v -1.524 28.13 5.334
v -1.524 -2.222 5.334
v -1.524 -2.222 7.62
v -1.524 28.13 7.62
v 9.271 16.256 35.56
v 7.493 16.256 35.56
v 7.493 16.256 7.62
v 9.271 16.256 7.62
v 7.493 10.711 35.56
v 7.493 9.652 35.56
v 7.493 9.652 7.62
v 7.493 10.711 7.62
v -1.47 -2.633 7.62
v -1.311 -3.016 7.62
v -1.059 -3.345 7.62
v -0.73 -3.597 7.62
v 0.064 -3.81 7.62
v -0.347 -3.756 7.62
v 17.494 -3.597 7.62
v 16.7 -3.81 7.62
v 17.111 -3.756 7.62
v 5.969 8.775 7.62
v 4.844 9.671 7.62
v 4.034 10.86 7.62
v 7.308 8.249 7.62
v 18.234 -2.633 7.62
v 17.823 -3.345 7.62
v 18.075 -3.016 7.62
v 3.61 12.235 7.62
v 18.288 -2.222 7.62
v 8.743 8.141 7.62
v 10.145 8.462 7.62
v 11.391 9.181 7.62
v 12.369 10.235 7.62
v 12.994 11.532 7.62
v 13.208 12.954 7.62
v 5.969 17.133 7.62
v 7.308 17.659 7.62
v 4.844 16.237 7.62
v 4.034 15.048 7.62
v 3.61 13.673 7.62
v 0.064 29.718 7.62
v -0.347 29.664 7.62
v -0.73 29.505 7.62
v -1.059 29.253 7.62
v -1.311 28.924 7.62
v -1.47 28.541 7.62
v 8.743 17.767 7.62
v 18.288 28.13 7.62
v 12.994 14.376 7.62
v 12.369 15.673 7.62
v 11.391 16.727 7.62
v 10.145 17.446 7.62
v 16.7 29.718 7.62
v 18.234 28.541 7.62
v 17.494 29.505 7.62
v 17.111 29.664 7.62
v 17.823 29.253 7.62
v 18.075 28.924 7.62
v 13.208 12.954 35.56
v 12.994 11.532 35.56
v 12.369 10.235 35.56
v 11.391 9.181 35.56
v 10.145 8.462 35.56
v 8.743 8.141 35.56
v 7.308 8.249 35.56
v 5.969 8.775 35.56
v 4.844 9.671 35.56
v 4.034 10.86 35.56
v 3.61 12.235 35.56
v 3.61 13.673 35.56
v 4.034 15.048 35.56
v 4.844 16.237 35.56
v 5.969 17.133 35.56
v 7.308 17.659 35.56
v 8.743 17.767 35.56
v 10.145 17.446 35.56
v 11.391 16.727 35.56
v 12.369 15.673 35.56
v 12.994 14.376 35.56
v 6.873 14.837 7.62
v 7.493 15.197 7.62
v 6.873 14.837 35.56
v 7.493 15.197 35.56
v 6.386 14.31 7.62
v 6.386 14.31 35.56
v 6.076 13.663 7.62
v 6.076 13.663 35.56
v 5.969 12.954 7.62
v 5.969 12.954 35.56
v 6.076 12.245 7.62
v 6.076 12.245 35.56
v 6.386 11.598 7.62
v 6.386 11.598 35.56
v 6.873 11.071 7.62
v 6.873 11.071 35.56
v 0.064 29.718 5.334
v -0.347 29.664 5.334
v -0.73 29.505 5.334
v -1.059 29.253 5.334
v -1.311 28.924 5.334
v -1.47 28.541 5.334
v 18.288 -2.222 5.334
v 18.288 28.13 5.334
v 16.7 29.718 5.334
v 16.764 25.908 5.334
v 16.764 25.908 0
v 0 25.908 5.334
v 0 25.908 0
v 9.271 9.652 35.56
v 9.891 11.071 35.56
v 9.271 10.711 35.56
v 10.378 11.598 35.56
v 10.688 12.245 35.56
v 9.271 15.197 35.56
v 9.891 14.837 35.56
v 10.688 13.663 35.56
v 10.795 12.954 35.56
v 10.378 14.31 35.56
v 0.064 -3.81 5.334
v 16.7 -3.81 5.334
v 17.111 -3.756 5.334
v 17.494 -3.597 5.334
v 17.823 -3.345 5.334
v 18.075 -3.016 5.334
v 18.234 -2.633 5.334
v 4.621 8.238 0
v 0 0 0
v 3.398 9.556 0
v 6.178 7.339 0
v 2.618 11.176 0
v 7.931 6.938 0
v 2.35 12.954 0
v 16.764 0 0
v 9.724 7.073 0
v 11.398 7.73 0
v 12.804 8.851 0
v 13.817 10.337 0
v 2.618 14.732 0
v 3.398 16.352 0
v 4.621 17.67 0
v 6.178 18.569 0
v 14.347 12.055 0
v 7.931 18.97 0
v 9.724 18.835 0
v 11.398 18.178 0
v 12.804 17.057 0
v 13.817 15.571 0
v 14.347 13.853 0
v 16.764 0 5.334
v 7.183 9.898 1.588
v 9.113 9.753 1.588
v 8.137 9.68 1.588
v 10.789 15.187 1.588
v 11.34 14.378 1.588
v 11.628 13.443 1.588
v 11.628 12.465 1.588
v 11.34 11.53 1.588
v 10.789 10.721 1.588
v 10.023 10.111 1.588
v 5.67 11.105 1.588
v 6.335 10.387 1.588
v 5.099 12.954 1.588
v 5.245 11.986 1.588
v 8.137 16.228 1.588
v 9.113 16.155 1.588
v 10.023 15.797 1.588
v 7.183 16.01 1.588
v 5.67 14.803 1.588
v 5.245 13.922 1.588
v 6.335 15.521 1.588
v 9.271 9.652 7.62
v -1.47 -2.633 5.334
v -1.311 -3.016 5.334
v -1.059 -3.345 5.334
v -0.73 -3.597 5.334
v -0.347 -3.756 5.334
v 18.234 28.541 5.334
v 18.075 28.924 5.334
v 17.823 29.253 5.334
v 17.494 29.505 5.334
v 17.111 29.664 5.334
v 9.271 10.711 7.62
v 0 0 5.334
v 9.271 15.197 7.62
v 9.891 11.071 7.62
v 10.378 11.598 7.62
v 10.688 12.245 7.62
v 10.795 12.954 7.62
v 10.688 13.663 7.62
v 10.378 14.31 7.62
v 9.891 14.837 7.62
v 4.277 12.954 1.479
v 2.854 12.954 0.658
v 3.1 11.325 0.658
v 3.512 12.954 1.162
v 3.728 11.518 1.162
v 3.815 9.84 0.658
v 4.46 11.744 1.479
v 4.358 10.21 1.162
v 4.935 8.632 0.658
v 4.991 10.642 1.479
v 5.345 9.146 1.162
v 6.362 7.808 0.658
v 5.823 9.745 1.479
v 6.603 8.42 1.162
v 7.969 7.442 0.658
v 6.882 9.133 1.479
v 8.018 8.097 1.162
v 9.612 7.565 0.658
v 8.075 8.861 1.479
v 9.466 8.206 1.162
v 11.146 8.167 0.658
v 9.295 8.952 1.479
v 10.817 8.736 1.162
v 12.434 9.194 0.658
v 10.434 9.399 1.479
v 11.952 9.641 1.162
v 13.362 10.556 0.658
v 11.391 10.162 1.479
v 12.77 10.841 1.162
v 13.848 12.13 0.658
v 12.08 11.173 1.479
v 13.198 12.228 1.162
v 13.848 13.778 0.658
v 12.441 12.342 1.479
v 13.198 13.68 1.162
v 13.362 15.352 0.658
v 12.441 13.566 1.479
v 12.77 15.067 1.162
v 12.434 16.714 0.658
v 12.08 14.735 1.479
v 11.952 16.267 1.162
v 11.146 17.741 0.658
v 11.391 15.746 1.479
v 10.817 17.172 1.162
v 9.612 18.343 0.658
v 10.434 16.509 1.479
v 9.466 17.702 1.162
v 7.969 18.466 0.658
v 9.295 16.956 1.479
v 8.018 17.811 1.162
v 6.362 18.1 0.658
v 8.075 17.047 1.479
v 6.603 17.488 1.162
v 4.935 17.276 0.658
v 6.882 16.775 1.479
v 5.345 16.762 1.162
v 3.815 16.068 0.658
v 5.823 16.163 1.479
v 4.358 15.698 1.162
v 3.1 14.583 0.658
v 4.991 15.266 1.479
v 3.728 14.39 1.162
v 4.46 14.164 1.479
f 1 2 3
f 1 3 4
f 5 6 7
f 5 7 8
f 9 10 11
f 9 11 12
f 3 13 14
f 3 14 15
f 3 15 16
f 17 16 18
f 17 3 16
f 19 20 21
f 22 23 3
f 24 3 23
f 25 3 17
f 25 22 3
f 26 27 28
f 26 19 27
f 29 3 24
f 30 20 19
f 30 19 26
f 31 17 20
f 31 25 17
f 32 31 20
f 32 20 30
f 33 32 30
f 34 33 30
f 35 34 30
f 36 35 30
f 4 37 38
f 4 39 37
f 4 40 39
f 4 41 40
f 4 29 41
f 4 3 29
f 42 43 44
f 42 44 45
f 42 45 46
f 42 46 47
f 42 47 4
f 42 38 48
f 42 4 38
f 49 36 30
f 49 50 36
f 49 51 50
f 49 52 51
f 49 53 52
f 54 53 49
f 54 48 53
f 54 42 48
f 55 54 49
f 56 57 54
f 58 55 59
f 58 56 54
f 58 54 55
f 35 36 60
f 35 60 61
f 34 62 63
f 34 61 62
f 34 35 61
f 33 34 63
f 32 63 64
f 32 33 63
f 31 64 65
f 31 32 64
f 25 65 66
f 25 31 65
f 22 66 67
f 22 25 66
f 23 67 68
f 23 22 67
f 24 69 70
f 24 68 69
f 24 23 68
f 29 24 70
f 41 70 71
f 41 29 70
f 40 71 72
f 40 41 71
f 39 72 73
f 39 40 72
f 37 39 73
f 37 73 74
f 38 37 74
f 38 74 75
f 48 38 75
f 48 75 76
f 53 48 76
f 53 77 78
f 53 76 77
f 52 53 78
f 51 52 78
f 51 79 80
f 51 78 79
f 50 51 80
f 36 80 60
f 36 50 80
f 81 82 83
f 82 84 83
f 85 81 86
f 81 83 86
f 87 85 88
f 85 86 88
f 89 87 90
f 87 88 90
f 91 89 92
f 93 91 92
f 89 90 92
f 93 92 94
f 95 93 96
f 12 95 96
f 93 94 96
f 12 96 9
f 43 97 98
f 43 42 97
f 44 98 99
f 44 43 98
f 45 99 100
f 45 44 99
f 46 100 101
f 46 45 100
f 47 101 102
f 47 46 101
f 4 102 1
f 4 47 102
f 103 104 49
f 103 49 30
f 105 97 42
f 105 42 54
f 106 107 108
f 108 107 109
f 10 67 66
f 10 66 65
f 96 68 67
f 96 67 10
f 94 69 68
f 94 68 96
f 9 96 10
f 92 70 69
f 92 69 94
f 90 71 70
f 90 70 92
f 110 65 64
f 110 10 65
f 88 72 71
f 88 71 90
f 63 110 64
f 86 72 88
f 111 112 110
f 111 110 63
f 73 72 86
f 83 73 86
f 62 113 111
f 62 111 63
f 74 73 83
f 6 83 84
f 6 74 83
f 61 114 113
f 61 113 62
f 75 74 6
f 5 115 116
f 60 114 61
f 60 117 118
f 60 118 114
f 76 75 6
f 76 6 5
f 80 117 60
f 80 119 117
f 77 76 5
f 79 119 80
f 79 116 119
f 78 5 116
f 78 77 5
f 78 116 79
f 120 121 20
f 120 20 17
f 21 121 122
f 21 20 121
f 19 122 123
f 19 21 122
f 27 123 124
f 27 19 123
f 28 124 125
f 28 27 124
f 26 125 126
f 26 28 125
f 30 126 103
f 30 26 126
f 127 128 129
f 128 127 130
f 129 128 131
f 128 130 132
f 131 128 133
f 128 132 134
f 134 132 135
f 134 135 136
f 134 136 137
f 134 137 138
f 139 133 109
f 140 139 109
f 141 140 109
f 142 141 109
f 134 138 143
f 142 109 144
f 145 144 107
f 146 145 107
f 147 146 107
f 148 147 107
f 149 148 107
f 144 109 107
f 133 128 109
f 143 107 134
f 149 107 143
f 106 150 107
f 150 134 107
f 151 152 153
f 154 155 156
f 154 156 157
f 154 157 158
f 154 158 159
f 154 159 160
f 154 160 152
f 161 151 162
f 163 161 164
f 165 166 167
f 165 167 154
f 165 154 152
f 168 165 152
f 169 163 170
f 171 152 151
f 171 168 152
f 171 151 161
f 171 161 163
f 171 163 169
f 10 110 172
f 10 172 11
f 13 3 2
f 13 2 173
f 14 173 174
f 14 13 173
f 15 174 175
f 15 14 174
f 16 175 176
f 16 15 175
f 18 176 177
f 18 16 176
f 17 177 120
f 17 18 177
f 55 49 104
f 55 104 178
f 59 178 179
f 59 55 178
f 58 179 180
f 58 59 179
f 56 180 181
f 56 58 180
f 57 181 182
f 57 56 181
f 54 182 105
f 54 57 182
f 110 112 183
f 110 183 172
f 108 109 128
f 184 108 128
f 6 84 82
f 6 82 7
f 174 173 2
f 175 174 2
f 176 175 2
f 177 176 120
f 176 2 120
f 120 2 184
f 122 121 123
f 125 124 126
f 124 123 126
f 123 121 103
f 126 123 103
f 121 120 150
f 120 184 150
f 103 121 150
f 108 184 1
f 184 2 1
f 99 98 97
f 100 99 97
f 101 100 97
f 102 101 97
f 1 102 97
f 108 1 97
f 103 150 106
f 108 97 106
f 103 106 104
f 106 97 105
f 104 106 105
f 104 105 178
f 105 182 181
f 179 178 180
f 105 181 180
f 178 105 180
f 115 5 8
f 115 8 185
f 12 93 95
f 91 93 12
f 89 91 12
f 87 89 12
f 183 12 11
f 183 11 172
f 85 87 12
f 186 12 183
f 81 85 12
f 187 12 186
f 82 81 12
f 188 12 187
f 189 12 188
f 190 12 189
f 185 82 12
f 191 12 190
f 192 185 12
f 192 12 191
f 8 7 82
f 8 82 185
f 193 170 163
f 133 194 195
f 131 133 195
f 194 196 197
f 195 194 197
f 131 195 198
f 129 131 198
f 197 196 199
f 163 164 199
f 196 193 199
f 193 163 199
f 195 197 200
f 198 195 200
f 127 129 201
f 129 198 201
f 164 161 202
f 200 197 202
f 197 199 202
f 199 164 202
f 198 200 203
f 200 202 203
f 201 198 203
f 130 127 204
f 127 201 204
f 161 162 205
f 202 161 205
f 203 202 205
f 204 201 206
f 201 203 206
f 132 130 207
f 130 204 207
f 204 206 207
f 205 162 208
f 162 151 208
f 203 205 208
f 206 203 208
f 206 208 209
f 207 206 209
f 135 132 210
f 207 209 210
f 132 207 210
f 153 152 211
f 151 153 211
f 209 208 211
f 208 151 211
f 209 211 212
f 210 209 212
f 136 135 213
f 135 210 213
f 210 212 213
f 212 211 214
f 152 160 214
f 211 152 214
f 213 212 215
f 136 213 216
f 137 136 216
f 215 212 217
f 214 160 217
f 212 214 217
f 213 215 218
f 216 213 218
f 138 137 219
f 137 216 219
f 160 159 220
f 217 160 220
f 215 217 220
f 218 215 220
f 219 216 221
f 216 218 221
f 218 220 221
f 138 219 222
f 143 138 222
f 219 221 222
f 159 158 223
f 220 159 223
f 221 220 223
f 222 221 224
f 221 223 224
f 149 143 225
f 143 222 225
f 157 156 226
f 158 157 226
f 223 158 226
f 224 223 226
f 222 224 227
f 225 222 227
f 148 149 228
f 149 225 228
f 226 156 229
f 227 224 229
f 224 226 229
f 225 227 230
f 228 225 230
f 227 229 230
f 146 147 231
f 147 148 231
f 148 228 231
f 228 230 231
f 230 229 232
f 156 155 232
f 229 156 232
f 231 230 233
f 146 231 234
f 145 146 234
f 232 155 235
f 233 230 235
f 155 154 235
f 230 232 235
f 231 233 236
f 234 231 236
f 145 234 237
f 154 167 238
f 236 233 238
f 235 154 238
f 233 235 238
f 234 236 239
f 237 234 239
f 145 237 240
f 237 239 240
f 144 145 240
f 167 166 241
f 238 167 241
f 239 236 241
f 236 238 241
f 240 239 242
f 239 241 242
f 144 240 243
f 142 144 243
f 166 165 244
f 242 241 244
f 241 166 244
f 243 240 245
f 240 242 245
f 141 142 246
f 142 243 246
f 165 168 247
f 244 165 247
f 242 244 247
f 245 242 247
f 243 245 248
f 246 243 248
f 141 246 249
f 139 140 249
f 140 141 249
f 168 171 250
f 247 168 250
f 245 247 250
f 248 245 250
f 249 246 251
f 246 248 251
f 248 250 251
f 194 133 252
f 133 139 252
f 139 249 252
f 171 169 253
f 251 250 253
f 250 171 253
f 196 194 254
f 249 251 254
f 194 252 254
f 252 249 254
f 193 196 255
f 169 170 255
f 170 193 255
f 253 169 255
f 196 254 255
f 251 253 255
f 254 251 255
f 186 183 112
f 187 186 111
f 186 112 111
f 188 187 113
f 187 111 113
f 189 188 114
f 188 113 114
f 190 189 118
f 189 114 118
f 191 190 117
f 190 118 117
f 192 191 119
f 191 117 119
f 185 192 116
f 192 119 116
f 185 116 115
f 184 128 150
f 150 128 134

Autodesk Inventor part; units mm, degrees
ref_plane "YZ Plane" through (0, 0, 0) normal (1, 0, 0) x (0, 1, 0)
ref_plane "XZ Plane" through (0, 0, 0) normal (0, 1, 0) x (-1, 0, 0)
ref_plane "XY Plane" through (0, 0, 0) normal (0, 0, 1) x (1, 0, 0)
sketch "Sketch1" plane through (0, 0, 0) normal (0, 0, 1) x (1, 0, 0)
  line L0 (0, 0) -> (16.764, 0)
  line L1 (16.764, 0) -> (16.764, 25.908)
  line L2 (16.764, 25.908) -> (0, 25.908)
  line L3 (0, 25.908) -> (0, 0)
  dimension "d0" = 16.764
  dimension "d1" = 25.908
extrude "Extrusion1" add sketch "Sketch1" along normal blind 5.334
sketch "Sketch2" plane through (0, 0, 5.334) normal (0, 0, 1) x (1, 0, 0)
  line L0 (-1.524, 29.718) -> (18.288, 29.718)
  line L1 (18.288, 29.718) -> (18.288, -3.81)
  line L2 (18.288, -3.81) -> (-1.524, -3.81)
  line L3 (-1.524, -3.81) -> (-1.524, 29.718)
  line L4 (16.764, 25.908) -> (0, 25.908) projected
  line L5 (0, 0) -> (16.764, 0) projected
  line L6 (0, 25.908) -> (0, 0) projected
  line L7 (16.764, 0) -> (16.764, 25.908) projected
  dimension "d4" = 3.81
  dimension "d5" = 3.81
  dimension "d6" = 1.524
  dimension "d7" = 1.524
extrude "Extrusion2" add sketch "Sketch2" along normal blind 2.286 contours L0 L1 L2 L3 | L7 L5 L6 L4
sketch "Sketch3" plane through (0, 0, 7.62) normal (0, 0, 1) x (1, 0, 0)
  circle A0 centre (8.382, 12.954) radius 4.826
  line L0 (18.288, 29.718) -> (-1.524, 29.718) projected
  line L1 (-1.524, -3.81) -> (18.288, -3.81) projected
  line L2 (-1.524, 29.718) -> (-1.524, -3.81) projected
  line L3 (18.288, -3.81) -> (18.288, 29.718) projected
  point P0 (0, 0)
  dimension "d10" = 16.764
  dimension "d11" = 16.764
  dimension "d12" = 9.906
  dimension "d13" = 9.906
  dimension "d14" = 9.652
extrude "Extrusion3" add sketch "Sketch3" along normal blind 27.94 contours A0
sketch "Sketch4" plane through (8.382, 12.954, 35.56) normal (0, 0, 1) x (1, 0, 0)
  circle A0 centre (0, 0) radius 2.413
  line L0 (-0.889, 3.302) -> (0.889, 3.302)
  line L1 (0.889, 3.302) -> (0.889, -3.302)
  line L2 (0.889, -3.302) -> (-0.889, -3.302)
  line L3 (-0.889, -3.302) -> (-0.889, 3.302)
  circle A1 centre (0, 0) radius 4.826 projected
  point P0 (-8.382, -12.954)
  point P1 (-0.889, 0)
  point P2 (0.889, 0)
  point P3 (-0.889, -2.2433)
  point P4 (0.889, -2.2433)
  point P5 (0.889, 2.2433)
  point P6 (-0.889, 2.2433)
  dimension "d17" = 4.826
  dimension "d18" = 0.889
  dimension "d19" = 0.889
  dimension "d20" = 3.302
  dimension "d21" = 3.302
extrude "Extrusion4" cut sketch "Sketch4" against normal blind 27.94 contours A0 L1 | L1 A0 L3 | A0 L3 L0 L1 | L1 L2 L3 A0 | L3 A0
sketch "Sketch5" plane through (0, 0, 0) normal (0, 0, -1) x (-1, 0, 0)
  arc A0 (-7.493, 10.7107) -> (-7.493, 15.1973) centre (-8.382, 12.954) ccw projected
  circle A1 centre (-8.382, 12.954) radius 6.0325
  point P0 (0, 0)
  dimension "d24" = 12.065
extrude "Extrusion5" cut sketch "Sketch5" against normal blind 1.5875
fillet "Fillet1" radius 3.175 1 edges at (14.4145, 12.954, 1.5875)
fillet "Fillet3" radius 1.5875 4 edges at (-1.524, 29.718, 6.477) (-1.524, -3.81, 6.477) (18.288, 29.718, 6.477) (18.288, -3.81, 6.477)
properties part number "reset_switch"
